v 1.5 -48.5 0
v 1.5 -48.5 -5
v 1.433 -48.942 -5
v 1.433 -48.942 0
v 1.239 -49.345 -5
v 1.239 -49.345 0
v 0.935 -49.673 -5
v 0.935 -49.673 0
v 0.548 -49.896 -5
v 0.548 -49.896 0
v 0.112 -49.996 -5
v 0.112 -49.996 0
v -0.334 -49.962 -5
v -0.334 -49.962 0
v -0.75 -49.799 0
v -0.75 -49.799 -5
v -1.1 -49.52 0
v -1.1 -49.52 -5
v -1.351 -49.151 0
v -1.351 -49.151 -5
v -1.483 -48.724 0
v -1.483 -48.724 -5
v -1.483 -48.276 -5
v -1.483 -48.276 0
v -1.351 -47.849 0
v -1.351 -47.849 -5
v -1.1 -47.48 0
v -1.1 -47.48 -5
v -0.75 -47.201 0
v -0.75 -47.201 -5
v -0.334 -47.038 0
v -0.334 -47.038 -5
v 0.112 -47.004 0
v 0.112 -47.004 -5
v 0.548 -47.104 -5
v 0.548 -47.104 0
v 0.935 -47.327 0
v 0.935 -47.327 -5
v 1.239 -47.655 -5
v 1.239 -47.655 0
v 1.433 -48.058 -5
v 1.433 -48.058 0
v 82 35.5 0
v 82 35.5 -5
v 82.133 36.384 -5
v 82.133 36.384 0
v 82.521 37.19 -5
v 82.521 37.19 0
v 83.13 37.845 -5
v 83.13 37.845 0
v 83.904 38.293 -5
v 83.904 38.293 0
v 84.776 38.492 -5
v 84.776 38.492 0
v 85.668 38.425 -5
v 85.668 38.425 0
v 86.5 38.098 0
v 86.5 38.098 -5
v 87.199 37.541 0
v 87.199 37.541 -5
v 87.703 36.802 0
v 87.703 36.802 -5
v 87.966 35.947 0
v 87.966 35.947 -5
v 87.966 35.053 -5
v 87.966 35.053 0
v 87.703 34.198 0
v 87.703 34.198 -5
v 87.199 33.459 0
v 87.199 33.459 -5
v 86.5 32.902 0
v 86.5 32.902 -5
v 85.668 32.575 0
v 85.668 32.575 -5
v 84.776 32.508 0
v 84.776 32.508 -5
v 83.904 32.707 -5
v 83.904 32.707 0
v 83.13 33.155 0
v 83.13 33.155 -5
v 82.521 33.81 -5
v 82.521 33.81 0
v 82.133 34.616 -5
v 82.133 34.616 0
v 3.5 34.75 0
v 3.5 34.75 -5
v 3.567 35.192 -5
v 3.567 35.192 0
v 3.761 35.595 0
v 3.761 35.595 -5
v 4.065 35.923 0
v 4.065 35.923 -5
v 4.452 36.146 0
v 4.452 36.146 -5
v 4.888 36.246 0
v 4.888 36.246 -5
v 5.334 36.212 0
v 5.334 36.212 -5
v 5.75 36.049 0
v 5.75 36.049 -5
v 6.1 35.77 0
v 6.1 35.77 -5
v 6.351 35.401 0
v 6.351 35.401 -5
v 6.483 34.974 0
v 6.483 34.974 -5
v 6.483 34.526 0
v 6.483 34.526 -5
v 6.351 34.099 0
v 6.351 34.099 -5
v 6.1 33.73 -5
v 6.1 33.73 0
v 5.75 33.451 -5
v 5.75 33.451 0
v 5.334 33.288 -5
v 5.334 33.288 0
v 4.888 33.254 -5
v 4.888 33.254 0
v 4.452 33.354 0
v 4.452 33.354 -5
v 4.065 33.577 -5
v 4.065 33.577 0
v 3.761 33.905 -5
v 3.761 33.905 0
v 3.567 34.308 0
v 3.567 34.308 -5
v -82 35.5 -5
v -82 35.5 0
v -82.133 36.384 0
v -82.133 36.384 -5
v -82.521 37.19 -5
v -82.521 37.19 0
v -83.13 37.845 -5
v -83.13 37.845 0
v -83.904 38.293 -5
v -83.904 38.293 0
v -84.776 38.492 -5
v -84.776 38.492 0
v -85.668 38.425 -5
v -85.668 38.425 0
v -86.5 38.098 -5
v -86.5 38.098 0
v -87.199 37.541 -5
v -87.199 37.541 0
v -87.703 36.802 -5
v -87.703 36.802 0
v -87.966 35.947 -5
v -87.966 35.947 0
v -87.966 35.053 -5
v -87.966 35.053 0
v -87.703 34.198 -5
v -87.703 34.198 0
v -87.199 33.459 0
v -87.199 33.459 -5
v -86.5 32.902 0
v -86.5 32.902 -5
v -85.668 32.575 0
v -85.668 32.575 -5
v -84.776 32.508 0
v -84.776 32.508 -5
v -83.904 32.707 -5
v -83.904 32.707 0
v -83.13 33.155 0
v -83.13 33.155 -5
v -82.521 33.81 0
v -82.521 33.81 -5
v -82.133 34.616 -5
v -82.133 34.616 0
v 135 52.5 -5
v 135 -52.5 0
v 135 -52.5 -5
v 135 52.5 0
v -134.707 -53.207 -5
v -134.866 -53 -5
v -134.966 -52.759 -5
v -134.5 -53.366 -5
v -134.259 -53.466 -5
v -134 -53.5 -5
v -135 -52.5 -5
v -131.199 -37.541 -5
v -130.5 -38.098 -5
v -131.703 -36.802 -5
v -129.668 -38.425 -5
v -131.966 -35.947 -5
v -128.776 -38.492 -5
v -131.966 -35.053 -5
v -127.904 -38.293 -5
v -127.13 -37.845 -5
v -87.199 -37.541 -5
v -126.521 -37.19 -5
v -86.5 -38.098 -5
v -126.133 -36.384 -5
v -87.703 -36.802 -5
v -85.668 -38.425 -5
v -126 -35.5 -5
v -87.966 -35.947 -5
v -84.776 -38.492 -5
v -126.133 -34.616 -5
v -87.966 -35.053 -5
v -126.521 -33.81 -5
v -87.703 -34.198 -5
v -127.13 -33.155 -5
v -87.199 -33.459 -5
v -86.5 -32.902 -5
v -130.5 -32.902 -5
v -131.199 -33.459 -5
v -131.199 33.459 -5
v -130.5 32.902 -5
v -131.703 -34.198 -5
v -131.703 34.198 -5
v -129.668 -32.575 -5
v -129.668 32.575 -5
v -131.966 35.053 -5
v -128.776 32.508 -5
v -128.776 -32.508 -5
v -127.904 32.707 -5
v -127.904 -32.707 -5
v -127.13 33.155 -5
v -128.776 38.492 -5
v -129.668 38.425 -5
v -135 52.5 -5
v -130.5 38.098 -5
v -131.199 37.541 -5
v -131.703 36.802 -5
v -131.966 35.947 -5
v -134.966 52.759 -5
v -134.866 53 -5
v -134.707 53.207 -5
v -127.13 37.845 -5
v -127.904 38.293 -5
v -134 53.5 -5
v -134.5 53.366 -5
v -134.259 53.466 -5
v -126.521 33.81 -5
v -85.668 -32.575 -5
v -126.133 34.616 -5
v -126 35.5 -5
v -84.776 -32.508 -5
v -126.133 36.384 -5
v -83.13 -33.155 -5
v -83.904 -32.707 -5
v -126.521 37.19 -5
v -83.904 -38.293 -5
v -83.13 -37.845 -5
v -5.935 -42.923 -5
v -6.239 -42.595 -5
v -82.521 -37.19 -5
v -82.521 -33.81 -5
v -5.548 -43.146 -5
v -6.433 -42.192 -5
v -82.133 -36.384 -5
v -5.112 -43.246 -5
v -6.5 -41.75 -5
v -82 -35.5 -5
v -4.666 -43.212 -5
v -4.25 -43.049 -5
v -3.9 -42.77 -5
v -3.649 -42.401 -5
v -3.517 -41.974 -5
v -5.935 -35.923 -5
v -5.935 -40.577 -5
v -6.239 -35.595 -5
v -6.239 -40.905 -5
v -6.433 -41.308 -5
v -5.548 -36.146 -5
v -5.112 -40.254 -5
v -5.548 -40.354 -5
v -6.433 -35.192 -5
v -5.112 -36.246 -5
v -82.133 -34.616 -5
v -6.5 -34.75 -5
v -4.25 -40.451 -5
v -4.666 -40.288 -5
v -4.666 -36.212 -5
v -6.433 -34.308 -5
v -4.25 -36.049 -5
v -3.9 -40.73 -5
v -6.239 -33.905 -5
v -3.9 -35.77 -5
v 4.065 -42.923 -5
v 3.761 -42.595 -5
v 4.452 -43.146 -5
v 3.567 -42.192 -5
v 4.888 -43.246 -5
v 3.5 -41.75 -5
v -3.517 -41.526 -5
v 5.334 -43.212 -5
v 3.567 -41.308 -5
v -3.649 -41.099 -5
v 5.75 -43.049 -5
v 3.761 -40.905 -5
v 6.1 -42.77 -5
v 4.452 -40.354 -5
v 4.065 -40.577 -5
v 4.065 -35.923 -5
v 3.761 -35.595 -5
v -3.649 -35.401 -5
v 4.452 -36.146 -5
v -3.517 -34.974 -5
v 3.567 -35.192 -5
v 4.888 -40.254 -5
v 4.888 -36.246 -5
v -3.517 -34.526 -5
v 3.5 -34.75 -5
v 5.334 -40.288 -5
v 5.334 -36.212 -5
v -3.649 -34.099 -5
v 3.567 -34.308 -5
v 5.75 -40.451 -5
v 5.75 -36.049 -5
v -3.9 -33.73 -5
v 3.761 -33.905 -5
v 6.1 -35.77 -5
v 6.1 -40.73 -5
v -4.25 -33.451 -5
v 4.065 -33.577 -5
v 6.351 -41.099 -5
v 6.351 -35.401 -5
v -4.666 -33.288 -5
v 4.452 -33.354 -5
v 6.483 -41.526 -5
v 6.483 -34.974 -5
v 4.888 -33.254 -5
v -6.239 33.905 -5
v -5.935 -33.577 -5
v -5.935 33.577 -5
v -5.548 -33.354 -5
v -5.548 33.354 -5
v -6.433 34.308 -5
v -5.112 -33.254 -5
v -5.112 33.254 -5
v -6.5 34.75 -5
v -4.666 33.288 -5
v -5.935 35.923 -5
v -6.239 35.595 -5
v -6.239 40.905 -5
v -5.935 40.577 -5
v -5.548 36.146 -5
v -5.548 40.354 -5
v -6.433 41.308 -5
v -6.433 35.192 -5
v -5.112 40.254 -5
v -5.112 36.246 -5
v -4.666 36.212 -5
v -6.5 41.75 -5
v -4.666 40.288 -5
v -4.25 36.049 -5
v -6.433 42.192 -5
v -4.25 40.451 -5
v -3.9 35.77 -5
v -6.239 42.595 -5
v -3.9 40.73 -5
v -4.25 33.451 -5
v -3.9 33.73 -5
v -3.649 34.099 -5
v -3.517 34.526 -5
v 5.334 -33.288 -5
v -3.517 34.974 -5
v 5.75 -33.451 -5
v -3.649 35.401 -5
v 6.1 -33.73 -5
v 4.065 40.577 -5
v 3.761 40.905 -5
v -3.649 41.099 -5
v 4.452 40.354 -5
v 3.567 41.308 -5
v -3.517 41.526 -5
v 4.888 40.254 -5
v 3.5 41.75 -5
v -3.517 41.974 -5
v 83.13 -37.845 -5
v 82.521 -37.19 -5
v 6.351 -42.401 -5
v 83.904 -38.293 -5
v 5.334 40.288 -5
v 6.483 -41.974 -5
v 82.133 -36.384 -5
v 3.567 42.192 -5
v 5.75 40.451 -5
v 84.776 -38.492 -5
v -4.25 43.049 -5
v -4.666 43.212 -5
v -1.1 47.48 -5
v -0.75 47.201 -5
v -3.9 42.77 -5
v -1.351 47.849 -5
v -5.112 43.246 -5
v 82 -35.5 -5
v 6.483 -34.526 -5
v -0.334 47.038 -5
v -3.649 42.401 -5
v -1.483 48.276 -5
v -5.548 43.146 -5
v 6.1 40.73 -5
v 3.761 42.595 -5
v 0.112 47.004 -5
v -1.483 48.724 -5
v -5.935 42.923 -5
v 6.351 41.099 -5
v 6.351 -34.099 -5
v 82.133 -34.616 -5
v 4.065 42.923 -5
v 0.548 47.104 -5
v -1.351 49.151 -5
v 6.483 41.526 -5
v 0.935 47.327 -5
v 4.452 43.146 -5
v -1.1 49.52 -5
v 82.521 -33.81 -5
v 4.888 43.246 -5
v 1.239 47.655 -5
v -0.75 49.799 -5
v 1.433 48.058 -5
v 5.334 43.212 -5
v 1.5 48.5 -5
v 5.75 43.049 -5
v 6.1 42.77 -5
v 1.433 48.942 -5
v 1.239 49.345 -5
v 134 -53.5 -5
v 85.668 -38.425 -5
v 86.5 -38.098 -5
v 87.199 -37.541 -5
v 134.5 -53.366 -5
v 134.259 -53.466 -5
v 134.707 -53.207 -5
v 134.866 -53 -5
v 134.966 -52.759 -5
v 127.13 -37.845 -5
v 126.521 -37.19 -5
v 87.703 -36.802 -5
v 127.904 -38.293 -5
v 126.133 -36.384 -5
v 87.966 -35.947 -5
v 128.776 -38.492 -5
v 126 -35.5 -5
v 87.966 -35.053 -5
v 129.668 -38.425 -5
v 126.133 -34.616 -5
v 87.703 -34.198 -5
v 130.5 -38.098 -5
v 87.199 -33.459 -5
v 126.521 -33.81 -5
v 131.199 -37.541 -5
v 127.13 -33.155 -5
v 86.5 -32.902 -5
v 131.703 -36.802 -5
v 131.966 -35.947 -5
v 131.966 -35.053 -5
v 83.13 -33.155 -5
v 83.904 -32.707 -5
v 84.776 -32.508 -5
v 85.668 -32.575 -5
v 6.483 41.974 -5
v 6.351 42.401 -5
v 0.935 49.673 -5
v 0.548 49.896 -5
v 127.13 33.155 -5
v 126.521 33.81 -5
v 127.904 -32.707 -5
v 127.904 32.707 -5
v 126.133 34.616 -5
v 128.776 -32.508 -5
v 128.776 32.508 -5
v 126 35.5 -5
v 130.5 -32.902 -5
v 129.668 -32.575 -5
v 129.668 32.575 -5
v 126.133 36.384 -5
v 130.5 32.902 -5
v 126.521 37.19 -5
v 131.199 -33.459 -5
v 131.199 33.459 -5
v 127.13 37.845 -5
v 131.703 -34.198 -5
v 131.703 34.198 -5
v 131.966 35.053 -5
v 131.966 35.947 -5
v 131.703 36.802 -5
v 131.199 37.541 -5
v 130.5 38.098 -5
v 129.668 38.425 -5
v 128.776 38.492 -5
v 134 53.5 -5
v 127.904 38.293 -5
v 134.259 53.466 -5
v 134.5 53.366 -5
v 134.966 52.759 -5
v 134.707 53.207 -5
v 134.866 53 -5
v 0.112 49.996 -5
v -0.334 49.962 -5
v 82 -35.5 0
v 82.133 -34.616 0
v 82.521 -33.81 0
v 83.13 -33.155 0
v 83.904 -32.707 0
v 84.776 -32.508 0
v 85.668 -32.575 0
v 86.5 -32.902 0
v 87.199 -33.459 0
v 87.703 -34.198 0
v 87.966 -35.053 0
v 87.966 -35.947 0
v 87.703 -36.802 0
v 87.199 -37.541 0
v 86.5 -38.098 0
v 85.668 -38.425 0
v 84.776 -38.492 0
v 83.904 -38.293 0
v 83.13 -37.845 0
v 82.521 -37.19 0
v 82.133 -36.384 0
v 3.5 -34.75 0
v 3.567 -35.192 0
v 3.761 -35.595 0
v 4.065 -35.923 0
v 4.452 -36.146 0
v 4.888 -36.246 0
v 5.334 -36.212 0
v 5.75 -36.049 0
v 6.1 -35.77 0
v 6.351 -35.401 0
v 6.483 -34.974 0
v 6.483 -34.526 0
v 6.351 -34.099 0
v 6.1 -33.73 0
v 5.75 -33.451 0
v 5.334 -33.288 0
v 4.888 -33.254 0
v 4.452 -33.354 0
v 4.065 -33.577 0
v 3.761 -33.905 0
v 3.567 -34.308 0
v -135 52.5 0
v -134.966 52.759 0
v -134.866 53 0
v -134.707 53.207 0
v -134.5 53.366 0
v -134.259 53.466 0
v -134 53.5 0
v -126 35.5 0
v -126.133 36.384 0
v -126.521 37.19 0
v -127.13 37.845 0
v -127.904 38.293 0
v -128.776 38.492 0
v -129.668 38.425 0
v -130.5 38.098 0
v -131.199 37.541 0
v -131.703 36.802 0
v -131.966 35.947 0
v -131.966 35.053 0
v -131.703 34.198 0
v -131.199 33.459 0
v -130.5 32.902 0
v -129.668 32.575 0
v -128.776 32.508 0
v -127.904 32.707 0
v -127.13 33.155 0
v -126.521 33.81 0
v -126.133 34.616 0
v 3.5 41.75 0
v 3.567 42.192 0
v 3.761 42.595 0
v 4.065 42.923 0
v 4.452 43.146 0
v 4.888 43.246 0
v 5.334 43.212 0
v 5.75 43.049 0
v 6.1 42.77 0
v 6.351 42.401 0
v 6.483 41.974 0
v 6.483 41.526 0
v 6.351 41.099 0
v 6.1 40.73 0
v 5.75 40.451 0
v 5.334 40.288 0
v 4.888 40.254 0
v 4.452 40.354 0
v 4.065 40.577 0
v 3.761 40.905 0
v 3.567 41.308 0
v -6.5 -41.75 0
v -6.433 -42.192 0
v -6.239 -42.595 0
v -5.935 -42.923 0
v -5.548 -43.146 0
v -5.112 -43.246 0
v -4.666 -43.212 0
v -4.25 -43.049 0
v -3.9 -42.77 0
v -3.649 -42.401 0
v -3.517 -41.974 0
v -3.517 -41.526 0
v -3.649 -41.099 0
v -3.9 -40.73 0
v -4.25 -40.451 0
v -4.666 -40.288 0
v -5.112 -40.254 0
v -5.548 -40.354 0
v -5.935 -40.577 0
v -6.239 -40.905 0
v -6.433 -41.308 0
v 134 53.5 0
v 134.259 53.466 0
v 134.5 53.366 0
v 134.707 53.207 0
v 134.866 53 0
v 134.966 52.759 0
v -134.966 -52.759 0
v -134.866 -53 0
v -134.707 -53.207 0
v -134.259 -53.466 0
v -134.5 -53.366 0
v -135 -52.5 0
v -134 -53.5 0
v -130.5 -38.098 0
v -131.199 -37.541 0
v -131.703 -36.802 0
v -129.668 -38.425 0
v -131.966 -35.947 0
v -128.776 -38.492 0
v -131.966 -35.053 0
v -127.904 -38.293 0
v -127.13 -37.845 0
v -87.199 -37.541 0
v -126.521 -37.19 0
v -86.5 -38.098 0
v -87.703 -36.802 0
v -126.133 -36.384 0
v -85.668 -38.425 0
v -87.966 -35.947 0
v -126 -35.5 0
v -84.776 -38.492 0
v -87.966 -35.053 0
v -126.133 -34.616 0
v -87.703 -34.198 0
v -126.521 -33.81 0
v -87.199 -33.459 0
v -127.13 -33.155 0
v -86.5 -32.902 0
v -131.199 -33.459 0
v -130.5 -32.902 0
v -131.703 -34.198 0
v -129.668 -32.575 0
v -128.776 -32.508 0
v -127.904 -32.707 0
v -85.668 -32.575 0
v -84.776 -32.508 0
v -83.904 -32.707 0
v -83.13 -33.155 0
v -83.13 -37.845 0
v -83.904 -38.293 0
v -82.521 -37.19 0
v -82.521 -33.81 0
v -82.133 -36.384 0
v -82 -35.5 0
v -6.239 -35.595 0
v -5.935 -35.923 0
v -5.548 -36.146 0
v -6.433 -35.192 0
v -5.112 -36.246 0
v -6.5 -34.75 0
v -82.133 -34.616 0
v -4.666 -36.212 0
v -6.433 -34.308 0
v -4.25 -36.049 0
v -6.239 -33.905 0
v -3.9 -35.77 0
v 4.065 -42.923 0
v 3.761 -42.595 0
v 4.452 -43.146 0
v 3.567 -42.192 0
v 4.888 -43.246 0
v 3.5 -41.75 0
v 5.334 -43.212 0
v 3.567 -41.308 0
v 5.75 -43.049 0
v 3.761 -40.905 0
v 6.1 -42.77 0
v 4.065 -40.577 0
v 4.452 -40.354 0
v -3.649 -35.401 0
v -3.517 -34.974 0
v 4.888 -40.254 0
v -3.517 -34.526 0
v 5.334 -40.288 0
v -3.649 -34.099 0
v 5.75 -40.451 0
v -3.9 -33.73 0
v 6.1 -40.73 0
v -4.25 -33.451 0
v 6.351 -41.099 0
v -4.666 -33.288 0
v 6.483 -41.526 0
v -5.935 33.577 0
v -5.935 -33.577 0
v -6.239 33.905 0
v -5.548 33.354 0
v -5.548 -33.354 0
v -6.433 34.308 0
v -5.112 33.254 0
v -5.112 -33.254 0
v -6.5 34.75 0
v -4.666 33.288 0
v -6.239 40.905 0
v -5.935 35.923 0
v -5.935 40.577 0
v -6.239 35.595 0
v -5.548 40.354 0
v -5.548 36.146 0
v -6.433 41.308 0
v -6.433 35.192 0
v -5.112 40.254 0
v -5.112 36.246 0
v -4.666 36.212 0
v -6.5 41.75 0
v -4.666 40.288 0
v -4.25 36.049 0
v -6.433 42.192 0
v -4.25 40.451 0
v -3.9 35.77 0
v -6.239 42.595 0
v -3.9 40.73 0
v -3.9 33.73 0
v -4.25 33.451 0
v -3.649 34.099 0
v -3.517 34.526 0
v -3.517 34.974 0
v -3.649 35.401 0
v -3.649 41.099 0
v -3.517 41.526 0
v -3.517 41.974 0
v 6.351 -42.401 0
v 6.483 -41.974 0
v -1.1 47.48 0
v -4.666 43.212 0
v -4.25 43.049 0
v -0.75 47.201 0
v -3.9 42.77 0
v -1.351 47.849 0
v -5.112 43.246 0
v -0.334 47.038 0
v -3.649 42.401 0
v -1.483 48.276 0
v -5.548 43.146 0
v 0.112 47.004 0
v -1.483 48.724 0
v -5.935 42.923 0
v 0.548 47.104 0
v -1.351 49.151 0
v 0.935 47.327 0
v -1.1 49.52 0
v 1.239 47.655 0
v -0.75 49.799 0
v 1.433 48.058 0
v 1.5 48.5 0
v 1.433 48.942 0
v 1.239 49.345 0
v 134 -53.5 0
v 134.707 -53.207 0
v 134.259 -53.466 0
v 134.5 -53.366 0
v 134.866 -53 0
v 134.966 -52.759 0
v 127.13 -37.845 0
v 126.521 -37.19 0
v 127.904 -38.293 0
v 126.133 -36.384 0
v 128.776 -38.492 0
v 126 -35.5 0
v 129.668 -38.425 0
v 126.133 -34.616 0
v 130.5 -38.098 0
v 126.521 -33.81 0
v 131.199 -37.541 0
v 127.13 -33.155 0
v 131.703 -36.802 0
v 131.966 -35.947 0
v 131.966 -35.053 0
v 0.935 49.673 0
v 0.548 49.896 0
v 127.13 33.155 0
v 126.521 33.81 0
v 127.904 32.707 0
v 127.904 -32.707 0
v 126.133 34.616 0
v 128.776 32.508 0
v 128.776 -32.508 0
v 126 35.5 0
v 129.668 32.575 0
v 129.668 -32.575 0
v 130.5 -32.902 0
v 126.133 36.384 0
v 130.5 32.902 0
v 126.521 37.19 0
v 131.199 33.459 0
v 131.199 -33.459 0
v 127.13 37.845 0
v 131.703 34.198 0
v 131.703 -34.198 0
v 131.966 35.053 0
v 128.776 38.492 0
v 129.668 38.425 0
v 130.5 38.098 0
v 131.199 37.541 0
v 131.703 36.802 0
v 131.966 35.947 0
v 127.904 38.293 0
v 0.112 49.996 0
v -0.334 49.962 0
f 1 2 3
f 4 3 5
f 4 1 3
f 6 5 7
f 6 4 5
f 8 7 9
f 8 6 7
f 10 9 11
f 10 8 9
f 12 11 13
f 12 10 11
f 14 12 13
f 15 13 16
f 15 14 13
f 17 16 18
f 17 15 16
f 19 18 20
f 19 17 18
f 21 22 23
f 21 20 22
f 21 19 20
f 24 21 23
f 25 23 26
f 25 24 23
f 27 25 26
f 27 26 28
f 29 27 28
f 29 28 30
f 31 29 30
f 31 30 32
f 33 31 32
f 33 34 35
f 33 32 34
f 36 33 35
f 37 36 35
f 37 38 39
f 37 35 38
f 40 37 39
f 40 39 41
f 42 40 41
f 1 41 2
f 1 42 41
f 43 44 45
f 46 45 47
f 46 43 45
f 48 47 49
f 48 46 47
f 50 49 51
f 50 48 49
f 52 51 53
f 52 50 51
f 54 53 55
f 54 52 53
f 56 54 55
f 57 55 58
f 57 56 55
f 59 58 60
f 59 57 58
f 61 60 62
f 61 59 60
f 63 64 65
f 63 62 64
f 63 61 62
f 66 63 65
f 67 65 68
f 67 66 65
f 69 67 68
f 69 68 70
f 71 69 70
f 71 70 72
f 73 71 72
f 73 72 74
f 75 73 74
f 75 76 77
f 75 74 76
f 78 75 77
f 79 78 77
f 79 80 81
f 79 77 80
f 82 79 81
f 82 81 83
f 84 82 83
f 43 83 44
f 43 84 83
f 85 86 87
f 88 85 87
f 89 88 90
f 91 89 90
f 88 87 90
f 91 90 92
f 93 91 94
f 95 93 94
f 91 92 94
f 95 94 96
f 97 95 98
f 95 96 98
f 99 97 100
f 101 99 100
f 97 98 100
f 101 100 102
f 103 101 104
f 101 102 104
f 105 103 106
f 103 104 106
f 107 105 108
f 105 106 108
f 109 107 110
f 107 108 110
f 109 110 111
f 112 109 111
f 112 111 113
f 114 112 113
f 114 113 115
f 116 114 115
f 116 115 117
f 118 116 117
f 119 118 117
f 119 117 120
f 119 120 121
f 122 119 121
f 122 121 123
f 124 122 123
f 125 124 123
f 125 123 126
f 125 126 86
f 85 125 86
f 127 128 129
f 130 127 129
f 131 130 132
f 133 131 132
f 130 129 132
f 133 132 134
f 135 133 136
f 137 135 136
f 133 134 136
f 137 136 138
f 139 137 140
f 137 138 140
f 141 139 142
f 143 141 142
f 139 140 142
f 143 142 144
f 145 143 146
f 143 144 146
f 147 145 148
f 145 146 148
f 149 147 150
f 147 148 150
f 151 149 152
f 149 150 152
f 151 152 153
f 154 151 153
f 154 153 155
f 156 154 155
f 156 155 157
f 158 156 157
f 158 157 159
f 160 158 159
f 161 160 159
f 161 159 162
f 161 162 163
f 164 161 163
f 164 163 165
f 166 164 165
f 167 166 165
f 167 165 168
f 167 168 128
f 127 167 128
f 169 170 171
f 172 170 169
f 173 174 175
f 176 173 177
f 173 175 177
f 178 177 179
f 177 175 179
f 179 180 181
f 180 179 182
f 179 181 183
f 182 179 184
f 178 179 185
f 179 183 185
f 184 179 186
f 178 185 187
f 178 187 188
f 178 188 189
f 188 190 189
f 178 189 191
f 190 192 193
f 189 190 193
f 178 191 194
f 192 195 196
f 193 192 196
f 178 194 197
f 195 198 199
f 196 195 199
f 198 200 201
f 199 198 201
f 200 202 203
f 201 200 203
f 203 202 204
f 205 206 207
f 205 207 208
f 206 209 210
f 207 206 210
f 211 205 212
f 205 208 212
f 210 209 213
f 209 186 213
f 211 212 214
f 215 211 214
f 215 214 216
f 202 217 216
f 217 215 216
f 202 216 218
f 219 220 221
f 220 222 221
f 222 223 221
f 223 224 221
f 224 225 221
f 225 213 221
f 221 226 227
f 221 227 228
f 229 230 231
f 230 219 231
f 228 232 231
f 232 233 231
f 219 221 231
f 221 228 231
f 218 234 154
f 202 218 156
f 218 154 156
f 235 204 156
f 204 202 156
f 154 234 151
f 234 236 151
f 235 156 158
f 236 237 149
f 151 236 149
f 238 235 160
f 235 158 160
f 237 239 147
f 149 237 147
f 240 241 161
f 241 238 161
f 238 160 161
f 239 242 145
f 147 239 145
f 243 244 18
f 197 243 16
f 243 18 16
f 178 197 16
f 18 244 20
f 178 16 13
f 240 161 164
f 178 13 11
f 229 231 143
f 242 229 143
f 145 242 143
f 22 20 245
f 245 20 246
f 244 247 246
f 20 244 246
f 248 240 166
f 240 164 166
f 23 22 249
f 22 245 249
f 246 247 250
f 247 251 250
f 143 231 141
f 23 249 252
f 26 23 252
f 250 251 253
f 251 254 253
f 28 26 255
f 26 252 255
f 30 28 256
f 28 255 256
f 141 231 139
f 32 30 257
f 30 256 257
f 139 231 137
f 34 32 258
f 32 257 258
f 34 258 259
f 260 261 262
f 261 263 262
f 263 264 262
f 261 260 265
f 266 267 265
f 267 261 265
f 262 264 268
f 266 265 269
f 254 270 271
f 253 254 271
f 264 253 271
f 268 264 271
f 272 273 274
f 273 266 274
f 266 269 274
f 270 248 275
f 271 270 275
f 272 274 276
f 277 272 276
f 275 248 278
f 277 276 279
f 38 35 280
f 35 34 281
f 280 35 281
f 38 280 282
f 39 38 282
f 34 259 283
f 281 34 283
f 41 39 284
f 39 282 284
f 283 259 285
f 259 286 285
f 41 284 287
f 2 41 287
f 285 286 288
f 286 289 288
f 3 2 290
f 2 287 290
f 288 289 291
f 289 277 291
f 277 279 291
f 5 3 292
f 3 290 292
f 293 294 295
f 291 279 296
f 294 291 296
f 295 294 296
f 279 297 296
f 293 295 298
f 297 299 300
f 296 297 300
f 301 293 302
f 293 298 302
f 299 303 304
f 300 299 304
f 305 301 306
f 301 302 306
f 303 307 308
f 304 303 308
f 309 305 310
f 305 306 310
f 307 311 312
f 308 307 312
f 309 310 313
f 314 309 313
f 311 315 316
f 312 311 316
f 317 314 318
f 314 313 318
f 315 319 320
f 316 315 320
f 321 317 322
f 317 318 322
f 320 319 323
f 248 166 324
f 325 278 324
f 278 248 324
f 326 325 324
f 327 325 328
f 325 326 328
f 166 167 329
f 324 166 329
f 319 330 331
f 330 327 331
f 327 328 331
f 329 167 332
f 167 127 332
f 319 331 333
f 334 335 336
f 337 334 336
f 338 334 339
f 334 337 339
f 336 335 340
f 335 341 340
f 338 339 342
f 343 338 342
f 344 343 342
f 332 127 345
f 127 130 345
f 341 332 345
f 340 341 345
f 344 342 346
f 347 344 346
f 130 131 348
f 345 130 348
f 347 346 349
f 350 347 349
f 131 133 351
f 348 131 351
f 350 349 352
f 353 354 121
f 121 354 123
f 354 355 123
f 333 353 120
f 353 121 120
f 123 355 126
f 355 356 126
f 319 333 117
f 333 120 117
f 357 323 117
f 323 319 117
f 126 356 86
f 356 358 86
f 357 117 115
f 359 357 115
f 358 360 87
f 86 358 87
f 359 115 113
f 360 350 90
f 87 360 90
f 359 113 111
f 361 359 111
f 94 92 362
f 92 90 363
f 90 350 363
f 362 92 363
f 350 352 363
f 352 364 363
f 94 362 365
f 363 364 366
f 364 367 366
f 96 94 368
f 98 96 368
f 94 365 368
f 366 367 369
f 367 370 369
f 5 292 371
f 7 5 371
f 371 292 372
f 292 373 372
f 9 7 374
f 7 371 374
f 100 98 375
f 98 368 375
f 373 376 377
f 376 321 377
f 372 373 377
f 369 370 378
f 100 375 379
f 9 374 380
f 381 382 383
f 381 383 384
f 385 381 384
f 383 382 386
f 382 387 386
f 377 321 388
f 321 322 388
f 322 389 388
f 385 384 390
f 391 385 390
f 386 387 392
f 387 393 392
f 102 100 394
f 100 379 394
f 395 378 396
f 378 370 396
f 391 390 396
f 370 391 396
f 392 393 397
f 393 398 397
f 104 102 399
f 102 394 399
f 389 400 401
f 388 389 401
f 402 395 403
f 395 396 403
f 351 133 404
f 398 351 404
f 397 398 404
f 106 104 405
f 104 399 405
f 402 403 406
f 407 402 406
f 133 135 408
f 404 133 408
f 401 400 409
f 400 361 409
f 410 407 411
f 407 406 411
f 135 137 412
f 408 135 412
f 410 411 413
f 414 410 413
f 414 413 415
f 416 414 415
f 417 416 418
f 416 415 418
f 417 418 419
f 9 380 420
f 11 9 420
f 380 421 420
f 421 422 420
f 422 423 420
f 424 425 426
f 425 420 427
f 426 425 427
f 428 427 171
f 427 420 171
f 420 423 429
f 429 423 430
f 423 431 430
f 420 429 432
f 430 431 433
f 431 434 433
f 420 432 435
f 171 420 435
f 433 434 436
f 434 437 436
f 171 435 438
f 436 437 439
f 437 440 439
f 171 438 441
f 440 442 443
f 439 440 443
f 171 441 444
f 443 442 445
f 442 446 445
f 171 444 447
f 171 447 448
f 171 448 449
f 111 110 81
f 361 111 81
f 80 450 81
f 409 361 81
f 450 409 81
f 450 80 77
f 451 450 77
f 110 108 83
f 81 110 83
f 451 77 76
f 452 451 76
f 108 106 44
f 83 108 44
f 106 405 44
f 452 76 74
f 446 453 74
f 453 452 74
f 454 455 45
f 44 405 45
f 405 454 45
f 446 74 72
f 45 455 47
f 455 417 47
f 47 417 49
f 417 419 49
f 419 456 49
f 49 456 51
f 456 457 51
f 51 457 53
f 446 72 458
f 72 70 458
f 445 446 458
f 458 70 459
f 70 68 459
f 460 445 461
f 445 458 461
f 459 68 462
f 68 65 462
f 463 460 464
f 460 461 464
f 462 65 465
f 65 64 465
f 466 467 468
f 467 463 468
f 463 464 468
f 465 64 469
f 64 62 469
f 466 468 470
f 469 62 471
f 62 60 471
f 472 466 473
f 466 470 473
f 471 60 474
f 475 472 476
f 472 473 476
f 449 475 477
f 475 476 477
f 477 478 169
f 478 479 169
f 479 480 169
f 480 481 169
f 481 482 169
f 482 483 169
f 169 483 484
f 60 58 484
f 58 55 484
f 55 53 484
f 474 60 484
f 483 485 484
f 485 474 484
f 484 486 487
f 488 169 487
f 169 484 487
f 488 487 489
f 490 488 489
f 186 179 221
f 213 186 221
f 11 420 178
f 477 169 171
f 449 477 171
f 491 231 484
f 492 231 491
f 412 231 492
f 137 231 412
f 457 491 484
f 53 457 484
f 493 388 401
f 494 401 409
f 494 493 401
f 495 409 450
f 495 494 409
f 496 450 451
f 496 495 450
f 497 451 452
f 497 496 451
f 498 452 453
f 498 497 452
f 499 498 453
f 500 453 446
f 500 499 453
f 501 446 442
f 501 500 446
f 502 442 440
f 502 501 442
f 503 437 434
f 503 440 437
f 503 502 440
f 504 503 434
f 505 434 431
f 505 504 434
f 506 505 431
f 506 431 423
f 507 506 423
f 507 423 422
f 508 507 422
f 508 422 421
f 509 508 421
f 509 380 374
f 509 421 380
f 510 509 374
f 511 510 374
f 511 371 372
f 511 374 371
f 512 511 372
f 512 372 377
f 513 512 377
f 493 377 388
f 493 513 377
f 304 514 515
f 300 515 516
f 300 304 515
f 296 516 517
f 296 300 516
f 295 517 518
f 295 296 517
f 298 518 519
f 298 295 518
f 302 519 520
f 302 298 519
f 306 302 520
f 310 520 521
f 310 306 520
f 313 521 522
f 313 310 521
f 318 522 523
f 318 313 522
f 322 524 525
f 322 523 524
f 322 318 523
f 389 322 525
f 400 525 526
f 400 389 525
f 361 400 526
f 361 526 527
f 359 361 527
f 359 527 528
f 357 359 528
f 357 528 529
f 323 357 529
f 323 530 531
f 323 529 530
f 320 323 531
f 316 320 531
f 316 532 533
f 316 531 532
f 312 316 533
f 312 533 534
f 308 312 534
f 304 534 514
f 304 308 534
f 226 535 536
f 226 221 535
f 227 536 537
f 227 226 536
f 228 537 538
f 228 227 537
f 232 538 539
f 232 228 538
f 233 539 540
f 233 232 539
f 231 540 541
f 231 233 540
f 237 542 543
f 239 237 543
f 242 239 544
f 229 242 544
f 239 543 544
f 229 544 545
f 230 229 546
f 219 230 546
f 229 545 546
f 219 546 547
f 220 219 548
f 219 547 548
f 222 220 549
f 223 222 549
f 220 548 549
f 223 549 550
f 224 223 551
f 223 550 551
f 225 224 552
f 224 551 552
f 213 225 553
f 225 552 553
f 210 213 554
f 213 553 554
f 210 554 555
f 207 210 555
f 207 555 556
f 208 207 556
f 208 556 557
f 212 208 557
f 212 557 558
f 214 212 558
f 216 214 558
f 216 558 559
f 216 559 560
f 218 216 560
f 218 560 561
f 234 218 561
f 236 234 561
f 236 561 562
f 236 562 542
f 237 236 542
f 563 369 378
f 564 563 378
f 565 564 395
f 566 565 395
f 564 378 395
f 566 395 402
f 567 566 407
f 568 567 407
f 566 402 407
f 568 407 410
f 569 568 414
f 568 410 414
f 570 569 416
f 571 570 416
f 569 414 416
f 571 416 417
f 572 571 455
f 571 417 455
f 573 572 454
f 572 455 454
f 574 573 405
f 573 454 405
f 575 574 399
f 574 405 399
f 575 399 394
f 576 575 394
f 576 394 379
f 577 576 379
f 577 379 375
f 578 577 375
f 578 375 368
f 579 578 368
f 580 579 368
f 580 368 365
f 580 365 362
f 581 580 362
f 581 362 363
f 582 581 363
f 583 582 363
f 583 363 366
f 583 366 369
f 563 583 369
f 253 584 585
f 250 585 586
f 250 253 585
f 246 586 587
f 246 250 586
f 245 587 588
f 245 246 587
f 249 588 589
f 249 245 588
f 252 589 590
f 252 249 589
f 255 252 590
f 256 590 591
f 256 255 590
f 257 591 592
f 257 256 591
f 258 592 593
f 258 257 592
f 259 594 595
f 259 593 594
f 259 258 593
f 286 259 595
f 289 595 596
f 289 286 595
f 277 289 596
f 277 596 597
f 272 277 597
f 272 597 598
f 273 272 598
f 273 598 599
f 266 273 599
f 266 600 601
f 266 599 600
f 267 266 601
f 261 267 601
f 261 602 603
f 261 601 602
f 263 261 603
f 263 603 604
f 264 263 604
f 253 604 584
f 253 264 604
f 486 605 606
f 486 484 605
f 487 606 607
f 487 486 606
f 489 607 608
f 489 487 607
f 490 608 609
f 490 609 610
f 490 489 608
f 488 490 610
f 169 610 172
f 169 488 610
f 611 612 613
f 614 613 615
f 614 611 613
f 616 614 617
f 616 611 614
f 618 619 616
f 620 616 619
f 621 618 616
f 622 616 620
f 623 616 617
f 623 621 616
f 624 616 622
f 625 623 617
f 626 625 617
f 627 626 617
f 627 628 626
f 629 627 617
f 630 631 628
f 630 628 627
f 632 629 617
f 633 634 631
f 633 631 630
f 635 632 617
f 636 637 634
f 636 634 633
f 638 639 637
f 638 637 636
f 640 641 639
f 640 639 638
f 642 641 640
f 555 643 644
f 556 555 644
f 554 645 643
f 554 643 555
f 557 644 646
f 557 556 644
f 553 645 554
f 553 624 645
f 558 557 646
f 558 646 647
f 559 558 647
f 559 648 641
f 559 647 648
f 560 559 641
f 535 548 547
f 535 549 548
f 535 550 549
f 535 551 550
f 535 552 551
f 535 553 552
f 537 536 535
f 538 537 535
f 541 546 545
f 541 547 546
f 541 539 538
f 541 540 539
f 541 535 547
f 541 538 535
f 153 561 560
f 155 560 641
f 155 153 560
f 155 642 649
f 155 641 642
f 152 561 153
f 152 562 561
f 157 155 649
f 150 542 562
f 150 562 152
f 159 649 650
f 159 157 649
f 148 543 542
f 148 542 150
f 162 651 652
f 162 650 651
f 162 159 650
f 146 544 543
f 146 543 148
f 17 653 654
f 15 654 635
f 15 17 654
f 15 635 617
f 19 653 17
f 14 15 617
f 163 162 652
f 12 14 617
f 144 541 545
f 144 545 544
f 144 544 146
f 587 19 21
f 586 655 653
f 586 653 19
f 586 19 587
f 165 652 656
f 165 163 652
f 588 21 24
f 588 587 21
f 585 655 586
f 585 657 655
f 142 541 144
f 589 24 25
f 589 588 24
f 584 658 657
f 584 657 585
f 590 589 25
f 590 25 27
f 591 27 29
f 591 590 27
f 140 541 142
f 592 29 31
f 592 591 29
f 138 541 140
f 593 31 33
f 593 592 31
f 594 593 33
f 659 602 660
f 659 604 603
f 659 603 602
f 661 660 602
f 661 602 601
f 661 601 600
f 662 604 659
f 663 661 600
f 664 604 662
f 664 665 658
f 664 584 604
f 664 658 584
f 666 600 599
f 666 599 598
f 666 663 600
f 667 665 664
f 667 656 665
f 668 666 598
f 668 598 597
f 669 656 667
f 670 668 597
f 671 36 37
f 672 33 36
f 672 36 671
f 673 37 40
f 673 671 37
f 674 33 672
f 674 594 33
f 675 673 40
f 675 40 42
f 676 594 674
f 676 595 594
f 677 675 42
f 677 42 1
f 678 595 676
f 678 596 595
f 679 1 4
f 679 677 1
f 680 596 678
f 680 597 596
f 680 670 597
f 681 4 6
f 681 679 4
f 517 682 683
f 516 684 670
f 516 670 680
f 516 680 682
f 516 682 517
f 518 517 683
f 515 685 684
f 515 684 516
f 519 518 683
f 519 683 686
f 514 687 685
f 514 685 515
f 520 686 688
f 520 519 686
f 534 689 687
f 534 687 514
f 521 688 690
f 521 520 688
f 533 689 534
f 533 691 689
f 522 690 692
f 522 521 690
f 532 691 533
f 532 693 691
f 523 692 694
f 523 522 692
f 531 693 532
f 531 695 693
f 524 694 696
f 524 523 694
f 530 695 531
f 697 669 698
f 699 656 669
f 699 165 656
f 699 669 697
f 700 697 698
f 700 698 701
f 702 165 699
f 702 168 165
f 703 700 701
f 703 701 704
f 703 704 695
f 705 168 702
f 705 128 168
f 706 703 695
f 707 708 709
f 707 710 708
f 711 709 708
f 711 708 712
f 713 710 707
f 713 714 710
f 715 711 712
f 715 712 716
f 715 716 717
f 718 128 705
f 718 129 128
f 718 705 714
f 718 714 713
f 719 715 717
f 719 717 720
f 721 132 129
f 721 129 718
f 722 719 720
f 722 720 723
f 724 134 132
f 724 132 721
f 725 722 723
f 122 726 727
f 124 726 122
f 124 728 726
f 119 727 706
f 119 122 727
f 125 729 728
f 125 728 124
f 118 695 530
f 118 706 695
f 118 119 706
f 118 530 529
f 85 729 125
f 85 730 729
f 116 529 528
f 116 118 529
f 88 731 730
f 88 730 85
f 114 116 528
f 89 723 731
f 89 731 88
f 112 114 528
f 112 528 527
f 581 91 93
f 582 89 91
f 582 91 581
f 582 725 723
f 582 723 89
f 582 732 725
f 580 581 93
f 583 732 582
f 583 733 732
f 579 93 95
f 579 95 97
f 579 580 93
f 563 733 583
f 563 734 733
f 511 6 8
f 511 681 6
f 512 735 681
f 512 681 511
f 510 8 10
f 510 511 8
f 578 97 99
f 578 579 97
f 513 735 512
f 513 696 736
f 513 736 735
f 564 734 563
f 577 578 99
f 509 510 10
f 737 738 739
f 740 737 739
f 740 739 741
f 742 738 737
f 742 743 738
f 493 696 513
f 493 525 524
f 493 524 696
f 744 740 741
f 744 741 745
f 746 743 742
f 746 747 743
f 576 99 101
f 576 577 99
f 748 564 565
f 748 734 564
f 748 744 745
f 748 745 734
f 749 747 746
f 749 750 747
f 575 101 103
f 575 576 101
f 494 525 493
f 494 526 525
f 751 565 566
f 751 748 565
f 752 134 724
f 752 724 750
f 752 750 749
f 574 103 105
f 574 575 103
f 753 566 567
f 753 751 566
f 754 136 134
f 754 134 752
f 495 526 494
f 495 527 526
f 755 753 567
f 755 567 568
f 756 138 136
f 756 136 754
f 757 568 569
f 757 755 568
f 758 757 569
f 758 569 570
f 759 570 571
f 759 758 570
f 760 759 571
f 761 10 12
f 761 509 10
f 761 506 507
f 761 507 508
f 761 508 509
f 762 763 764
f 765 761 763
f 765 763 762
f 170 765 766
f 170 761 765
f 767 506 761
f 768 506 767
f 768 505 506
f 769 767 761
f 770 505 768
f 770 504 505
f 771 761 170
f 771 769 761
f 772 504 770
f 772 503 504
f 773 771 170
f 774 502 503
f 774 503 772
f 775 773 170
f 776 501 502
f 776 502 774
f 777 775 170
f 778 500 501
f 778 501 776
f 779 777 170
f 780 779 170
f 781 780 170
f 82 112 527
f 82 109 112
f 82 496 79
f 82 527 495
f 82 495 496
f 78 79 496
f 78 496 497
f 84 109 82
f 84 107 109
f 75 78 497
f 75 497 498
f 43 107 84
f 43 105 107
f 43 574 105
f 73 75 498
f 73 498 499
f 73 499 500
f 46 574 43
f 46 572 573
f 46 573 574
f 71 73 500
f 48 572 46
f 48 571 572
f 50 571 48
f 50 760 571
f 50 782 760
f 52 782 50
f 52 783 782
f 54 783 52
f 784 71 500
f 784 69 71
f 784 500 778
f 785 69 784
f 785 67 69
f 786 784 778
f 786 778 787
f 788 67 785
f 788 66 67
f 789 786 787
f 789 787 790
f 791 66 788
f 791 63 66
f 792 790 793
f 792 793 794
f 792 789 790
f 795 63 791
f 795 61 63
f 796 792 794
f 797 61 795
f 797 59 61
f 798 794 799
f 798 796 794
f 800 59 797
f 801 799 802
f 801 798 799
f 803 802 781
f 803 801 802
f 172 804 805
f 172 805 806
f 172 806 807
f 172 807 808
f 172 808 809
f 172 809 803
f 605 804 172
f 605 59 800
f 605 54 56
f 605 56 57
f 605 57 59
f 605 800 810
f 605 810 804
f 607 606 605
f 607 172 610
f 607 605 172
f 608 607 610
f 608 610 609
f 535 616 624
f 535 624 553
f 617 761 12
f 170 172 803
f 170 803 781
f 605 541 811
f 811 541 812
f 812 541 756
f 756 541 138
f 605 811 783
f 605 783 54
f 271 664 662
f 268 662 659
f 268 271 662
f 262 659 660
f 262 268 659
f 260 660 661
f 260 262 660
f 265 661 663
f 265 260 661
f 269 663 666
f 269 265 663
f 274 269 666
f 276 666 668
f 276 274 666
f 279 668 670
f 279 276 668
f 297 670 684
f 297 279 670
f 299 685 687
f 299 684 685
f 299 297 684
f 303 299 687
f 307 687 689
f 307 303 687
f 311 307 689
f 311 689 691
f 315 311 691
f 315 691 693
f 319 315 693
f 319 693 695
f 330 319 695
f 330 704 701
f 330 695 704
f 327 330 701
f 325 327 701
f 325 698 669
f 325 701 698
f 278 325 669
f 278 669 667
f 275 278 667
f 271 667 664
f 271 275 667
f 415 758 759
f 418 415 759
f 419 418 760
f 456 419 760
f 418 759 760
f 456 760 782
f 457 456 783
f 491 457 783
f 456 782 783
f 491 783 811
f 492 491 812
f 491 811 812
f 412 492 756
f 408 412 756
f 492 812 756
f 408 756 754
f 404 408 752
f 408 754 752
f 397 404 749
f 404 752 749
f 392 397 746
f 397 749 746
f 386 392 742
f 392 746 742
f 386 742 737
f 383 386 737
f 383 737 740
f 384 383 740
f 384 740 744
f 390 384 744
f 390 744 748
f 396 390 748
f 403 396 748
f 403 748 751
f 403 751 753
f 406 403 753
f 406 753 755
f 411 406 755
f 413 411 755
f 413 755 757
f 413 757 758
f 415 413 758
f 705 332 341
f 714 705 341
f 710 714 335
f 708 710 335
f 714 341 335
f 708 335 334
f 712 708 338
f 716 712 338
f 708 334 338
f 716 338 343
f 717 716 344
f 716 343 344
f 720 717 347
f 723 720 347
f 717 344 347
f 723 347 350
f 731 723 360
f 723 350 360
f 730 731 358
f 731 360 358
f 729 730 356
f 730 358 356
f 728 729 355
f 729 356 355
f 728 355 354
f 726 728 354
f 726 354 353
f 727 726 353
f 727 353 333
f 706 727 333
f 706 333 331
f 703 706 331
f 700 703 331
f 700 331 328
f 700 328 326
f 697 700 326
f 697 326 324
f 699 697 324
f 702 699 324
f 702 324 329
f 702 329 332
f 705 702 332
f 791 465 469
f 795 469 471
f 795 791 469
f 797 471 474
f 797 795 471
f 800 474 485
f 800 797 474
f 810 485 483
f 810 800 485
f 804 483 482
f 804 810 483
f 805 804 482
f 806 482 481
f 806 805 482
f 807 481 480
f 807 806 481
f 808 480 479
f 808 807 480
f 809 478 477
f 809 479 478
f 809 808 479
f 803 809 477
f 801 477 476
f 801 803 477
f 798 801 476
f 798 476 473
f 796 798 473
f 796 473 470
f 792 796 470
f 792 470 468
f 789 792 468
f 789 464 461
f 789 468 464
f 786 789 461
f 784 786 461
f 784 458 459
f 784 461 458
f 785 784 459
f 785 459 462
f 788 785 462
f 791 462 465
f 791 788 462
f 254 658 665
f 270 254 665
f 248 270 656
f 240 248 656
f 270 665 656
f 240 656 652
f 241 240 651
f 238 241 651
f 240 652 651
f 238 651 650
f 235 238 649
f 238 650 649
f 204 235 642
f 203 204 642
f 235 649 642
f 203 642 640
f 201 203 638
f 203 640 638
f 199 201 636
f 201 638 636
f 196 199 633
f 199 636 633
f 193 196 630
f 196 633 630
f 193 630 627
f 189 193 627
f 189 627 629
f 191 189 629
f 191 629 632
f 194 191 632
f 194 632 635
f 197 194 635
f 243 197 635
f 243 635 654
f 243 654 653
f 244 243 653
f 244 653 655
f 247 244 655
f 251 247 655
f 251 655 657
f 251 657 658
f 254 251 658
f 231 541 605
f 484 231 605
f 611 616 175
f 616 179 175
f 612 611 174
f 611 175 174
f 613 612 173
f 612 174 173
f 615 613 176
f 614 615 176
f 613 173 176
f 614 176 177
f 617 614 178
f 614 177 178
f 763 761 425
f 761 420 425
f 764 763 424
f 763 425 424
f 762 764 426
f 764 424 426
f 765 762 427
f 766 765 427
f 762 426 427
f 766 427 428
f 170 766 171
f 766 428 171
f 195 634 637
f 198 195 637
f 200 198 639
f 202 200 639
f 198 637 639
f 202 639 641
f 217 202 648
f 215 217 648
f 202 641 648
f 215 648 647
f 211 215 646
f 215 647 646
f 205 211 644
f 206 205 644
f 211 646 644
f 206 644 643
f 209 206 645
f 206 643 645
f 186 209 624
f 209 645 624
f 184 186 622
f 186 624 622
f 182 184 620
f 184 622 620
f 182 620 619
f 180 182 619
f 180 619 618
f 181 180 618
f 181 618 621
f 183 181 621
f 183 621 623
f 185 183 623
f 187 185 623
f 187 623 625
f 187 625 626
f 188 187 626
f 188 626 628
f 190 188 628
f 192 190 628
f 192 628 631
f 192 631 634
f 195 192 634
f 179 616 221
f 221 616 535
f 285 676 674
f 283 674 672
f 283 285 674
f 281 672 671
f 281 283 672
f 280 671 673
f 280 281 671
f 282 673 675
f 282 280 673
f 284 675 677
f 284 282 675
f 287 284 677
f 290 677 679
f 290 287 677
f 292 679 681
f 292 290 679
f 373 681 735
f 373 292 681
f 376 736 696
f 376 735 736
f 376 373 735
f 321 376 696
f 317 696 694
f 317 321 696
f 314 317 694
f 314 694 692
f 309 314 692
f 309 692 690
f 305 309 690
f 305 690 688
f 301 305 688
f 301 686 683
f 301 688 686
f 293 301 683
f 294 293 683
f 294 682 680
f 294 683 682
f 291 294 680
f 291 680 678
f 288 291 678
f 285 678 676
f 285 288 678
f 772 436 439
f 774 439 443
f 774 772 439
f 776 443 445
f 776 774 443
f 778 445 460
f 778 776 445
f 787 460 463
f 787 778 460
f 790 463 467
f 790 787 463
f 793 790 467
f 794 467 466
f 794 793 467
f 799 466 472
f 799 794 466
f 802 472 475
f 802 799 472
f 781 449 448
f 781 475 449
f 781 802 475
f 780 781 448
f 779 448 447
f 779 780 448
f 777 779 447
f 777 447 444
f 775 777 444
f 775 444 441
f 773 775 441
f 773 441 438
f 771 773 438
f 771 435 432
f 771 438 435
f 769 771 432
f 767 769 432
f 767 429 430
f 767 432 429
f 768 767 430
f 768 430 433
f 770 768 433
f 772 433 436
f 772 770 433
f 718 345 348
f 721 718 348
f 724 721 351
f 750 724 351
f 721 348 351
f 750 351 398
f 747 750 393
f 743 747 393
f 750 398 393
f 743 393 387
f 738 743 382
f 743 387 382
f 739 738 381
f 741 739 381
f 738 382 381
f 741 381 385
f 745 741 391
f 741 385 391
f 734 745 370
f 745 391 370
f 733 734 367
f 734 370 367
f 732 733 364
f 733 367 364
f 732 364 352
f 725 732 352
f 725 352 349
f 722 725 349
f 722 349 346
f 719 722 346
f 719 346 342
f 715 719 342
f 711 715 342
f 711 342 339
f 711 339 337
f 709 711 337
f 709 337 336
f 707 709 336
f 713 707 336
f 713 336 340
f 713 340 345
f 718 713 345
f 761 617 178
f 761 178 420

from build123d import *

# Parameters (mm, degrees)
SKETCH_1_W             = 270
SKETCH_1_H             = 107
SM_BASE_FLANGE_1_DEPTH = 5
SKETCH_6_R             = 3
CUT_EXTRUDE_1_DEPTH    = 10
SKETCH_7_R             = 1.5
CUT_EXTRUDE_2_DEPTH    = 10
FILLET_1_R             = 1
SKETCH_8_R             = 1.5
CUT_EXTRUDE_3_DEPTH    = 10


# Sheet-metal steps are written as plain solids
with BuildPart() as part:
    # Sketch 1 → 基体-法兰1 (new body)
    with BuildSketch(Plane.XY):
        Rectangle(SKETCH_1_W, SKETCH_1_H)
    extrude(amount=-SM_BASE_FLANGE_1_DEPTH)

    # 草图6 → 切除-拉伸1 (cut)
    with BuildSketch(Plane.XY):
        with Locations((-129, 35.5)):
            Circle(SKETCH_6_R)
        with Locations((-129, -35.5)):
            Circle(SKETCH_6_R)
        with Locations((-85, 35.5)):
            Circle(SKETCH_6_R)
        with Locations((-85, -35.5)):
            Circle(SKETCH_6_R)
    cut_extrude_1 = extrude(amount=-CUT_EXTRUDE_1_DEPTH, mode=Mode.SUBTRACT)

    # 镜向1: 切除-拉伸1 across plane
    add(cut_extrude_1.mirror(Plane(origin=(0, 0, 0), x_dir=(0, 0, 1), z_dir=(1, 0, 0))), mode=Mode.SUBTRACT)

    # 草图7 → 切除-拉伸2 (cut)
    with BuildSketch(Plane.XY):
        with Locations((0, 48.5)):
            Circle(SKETCH_7_R)
    cut_extrude_2 = extrude(amount=-CUT_EXTRUDE_2_DEPTH, mode=Mode.SUBTRACT)

    # 镜向2: 切除-拉伸2 across plane
    add(cut_extrude_2.mirror(Plane.ZX), mode=Mode.SUBTRACT)

    # 圆角1
    fillet_1_edges = [part.edges().sort_by_distance(p)[0] for p in [
        (135, -53.5, -2.5),
        (-135, -53.5, -2.5),
        (-135, 53.5, -2.5),
        (135, 53.5, -2.5),
    ]]
    fillet(fillet_1_edges, radius=FILLET_1_R)

    # 草图8 → 切除-拉伸3 (cut)
    with BuildSketch(Plane(origin=(0, 0, -5), x_dir=(-1, 0, 0), z_dir=(0, 0, -1))):
        with Locations((-5, 41.75)):
            Circle(SKETCH_8_R)
        with Locations((5, 41.75)):
            Circle(SKETCH_8_R)
        with Locations((5, 34.75)):
            Circle(SKETCH_8_R)
        with Locations((-5, 34.75)):
            Circle(SKETCH_8_R)
    cut_extrude_3 = extrude(amount=-CUT_EXTRUDE_3_DEPTH, mode=Mode.SUBTRACT)

    # 镜向3: 切除-拉伸3 across plane
    add(cut_extrude_3.mirror(Plane.ZX), mode=Mode.SUBTRACT)


solid = part.part
